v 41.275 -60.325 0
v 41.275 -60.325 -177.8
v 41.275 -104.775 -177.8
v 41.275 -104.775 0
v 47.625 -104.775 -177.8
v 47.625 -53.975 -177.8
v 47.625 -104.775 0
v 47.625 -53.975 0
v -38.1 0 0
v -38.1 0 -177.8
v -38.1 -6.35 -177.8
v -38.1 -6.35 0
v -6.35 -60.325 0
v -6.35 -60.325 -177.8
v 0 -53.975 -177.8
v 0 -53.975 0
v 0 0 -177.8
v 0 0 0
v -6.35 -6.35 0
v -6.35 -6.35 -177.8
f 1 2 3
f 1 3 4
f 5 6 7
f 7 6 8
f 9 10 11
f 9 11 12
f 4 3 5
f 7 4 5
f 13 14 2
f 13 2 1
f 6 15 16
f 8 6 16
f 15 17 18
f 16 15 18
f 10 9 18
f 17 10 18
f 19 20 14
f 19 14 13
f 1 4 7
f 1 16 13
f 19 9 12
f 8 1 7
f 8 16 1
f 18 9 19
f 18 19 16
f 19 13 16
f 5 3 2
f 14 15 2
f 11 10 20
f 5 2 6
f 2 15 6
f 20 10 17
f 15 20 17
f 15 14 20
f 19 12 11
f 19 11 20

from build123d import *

# Parameters (mm, degrees)
F0_W     = 38.1
F0_H     = 177.8
F1_DEPTH = 6.35
F2_W     = 6.35
F2_H     = 177.8
F3_DEPTH = 53.975
F4_W     = 6.35
F4_H     = 177.8
F5_DEPTH = 47.625
F6_W     = 6.35
F6_H     = 177.8
F7_DEPTH = 44.45


with BuildPart() as f1:
    # F0 (on Front) → F1 (new body)
    with BuildSketch(Plane.XZ):
        with Locations((-19.05, -88.9)):
            Rectangle(F0_W, F0_H)
    extrude(amount=F1_DEPTH)

    # F2 (on face) → F3 (join)
    with BuildSketch(Plane.XZ.offset(6.35)):
        with Locations((-3.175, -88.9)):
            Rectangle(F2_W, F2_H)
    extrude(amount=F3_DEPTH)

    # F4 (on face) → F5 (join)
    with BuildSketch(Plane.YZ):
        with Locations((-57.15, -88.9)):
            Rectangle(F4_W, F4_H)
    extrude(amount=F5_DEPTH)

    # F6 (on face) → F7 (join)
    with BuildSketch(Plane.XZ.offset(60.325)):
        with Locations((44.45, -88.9)):
            Rectangle(F6_W, F6_H)
    extrude(amount=F7_DEPTH)


solid = f1.part
